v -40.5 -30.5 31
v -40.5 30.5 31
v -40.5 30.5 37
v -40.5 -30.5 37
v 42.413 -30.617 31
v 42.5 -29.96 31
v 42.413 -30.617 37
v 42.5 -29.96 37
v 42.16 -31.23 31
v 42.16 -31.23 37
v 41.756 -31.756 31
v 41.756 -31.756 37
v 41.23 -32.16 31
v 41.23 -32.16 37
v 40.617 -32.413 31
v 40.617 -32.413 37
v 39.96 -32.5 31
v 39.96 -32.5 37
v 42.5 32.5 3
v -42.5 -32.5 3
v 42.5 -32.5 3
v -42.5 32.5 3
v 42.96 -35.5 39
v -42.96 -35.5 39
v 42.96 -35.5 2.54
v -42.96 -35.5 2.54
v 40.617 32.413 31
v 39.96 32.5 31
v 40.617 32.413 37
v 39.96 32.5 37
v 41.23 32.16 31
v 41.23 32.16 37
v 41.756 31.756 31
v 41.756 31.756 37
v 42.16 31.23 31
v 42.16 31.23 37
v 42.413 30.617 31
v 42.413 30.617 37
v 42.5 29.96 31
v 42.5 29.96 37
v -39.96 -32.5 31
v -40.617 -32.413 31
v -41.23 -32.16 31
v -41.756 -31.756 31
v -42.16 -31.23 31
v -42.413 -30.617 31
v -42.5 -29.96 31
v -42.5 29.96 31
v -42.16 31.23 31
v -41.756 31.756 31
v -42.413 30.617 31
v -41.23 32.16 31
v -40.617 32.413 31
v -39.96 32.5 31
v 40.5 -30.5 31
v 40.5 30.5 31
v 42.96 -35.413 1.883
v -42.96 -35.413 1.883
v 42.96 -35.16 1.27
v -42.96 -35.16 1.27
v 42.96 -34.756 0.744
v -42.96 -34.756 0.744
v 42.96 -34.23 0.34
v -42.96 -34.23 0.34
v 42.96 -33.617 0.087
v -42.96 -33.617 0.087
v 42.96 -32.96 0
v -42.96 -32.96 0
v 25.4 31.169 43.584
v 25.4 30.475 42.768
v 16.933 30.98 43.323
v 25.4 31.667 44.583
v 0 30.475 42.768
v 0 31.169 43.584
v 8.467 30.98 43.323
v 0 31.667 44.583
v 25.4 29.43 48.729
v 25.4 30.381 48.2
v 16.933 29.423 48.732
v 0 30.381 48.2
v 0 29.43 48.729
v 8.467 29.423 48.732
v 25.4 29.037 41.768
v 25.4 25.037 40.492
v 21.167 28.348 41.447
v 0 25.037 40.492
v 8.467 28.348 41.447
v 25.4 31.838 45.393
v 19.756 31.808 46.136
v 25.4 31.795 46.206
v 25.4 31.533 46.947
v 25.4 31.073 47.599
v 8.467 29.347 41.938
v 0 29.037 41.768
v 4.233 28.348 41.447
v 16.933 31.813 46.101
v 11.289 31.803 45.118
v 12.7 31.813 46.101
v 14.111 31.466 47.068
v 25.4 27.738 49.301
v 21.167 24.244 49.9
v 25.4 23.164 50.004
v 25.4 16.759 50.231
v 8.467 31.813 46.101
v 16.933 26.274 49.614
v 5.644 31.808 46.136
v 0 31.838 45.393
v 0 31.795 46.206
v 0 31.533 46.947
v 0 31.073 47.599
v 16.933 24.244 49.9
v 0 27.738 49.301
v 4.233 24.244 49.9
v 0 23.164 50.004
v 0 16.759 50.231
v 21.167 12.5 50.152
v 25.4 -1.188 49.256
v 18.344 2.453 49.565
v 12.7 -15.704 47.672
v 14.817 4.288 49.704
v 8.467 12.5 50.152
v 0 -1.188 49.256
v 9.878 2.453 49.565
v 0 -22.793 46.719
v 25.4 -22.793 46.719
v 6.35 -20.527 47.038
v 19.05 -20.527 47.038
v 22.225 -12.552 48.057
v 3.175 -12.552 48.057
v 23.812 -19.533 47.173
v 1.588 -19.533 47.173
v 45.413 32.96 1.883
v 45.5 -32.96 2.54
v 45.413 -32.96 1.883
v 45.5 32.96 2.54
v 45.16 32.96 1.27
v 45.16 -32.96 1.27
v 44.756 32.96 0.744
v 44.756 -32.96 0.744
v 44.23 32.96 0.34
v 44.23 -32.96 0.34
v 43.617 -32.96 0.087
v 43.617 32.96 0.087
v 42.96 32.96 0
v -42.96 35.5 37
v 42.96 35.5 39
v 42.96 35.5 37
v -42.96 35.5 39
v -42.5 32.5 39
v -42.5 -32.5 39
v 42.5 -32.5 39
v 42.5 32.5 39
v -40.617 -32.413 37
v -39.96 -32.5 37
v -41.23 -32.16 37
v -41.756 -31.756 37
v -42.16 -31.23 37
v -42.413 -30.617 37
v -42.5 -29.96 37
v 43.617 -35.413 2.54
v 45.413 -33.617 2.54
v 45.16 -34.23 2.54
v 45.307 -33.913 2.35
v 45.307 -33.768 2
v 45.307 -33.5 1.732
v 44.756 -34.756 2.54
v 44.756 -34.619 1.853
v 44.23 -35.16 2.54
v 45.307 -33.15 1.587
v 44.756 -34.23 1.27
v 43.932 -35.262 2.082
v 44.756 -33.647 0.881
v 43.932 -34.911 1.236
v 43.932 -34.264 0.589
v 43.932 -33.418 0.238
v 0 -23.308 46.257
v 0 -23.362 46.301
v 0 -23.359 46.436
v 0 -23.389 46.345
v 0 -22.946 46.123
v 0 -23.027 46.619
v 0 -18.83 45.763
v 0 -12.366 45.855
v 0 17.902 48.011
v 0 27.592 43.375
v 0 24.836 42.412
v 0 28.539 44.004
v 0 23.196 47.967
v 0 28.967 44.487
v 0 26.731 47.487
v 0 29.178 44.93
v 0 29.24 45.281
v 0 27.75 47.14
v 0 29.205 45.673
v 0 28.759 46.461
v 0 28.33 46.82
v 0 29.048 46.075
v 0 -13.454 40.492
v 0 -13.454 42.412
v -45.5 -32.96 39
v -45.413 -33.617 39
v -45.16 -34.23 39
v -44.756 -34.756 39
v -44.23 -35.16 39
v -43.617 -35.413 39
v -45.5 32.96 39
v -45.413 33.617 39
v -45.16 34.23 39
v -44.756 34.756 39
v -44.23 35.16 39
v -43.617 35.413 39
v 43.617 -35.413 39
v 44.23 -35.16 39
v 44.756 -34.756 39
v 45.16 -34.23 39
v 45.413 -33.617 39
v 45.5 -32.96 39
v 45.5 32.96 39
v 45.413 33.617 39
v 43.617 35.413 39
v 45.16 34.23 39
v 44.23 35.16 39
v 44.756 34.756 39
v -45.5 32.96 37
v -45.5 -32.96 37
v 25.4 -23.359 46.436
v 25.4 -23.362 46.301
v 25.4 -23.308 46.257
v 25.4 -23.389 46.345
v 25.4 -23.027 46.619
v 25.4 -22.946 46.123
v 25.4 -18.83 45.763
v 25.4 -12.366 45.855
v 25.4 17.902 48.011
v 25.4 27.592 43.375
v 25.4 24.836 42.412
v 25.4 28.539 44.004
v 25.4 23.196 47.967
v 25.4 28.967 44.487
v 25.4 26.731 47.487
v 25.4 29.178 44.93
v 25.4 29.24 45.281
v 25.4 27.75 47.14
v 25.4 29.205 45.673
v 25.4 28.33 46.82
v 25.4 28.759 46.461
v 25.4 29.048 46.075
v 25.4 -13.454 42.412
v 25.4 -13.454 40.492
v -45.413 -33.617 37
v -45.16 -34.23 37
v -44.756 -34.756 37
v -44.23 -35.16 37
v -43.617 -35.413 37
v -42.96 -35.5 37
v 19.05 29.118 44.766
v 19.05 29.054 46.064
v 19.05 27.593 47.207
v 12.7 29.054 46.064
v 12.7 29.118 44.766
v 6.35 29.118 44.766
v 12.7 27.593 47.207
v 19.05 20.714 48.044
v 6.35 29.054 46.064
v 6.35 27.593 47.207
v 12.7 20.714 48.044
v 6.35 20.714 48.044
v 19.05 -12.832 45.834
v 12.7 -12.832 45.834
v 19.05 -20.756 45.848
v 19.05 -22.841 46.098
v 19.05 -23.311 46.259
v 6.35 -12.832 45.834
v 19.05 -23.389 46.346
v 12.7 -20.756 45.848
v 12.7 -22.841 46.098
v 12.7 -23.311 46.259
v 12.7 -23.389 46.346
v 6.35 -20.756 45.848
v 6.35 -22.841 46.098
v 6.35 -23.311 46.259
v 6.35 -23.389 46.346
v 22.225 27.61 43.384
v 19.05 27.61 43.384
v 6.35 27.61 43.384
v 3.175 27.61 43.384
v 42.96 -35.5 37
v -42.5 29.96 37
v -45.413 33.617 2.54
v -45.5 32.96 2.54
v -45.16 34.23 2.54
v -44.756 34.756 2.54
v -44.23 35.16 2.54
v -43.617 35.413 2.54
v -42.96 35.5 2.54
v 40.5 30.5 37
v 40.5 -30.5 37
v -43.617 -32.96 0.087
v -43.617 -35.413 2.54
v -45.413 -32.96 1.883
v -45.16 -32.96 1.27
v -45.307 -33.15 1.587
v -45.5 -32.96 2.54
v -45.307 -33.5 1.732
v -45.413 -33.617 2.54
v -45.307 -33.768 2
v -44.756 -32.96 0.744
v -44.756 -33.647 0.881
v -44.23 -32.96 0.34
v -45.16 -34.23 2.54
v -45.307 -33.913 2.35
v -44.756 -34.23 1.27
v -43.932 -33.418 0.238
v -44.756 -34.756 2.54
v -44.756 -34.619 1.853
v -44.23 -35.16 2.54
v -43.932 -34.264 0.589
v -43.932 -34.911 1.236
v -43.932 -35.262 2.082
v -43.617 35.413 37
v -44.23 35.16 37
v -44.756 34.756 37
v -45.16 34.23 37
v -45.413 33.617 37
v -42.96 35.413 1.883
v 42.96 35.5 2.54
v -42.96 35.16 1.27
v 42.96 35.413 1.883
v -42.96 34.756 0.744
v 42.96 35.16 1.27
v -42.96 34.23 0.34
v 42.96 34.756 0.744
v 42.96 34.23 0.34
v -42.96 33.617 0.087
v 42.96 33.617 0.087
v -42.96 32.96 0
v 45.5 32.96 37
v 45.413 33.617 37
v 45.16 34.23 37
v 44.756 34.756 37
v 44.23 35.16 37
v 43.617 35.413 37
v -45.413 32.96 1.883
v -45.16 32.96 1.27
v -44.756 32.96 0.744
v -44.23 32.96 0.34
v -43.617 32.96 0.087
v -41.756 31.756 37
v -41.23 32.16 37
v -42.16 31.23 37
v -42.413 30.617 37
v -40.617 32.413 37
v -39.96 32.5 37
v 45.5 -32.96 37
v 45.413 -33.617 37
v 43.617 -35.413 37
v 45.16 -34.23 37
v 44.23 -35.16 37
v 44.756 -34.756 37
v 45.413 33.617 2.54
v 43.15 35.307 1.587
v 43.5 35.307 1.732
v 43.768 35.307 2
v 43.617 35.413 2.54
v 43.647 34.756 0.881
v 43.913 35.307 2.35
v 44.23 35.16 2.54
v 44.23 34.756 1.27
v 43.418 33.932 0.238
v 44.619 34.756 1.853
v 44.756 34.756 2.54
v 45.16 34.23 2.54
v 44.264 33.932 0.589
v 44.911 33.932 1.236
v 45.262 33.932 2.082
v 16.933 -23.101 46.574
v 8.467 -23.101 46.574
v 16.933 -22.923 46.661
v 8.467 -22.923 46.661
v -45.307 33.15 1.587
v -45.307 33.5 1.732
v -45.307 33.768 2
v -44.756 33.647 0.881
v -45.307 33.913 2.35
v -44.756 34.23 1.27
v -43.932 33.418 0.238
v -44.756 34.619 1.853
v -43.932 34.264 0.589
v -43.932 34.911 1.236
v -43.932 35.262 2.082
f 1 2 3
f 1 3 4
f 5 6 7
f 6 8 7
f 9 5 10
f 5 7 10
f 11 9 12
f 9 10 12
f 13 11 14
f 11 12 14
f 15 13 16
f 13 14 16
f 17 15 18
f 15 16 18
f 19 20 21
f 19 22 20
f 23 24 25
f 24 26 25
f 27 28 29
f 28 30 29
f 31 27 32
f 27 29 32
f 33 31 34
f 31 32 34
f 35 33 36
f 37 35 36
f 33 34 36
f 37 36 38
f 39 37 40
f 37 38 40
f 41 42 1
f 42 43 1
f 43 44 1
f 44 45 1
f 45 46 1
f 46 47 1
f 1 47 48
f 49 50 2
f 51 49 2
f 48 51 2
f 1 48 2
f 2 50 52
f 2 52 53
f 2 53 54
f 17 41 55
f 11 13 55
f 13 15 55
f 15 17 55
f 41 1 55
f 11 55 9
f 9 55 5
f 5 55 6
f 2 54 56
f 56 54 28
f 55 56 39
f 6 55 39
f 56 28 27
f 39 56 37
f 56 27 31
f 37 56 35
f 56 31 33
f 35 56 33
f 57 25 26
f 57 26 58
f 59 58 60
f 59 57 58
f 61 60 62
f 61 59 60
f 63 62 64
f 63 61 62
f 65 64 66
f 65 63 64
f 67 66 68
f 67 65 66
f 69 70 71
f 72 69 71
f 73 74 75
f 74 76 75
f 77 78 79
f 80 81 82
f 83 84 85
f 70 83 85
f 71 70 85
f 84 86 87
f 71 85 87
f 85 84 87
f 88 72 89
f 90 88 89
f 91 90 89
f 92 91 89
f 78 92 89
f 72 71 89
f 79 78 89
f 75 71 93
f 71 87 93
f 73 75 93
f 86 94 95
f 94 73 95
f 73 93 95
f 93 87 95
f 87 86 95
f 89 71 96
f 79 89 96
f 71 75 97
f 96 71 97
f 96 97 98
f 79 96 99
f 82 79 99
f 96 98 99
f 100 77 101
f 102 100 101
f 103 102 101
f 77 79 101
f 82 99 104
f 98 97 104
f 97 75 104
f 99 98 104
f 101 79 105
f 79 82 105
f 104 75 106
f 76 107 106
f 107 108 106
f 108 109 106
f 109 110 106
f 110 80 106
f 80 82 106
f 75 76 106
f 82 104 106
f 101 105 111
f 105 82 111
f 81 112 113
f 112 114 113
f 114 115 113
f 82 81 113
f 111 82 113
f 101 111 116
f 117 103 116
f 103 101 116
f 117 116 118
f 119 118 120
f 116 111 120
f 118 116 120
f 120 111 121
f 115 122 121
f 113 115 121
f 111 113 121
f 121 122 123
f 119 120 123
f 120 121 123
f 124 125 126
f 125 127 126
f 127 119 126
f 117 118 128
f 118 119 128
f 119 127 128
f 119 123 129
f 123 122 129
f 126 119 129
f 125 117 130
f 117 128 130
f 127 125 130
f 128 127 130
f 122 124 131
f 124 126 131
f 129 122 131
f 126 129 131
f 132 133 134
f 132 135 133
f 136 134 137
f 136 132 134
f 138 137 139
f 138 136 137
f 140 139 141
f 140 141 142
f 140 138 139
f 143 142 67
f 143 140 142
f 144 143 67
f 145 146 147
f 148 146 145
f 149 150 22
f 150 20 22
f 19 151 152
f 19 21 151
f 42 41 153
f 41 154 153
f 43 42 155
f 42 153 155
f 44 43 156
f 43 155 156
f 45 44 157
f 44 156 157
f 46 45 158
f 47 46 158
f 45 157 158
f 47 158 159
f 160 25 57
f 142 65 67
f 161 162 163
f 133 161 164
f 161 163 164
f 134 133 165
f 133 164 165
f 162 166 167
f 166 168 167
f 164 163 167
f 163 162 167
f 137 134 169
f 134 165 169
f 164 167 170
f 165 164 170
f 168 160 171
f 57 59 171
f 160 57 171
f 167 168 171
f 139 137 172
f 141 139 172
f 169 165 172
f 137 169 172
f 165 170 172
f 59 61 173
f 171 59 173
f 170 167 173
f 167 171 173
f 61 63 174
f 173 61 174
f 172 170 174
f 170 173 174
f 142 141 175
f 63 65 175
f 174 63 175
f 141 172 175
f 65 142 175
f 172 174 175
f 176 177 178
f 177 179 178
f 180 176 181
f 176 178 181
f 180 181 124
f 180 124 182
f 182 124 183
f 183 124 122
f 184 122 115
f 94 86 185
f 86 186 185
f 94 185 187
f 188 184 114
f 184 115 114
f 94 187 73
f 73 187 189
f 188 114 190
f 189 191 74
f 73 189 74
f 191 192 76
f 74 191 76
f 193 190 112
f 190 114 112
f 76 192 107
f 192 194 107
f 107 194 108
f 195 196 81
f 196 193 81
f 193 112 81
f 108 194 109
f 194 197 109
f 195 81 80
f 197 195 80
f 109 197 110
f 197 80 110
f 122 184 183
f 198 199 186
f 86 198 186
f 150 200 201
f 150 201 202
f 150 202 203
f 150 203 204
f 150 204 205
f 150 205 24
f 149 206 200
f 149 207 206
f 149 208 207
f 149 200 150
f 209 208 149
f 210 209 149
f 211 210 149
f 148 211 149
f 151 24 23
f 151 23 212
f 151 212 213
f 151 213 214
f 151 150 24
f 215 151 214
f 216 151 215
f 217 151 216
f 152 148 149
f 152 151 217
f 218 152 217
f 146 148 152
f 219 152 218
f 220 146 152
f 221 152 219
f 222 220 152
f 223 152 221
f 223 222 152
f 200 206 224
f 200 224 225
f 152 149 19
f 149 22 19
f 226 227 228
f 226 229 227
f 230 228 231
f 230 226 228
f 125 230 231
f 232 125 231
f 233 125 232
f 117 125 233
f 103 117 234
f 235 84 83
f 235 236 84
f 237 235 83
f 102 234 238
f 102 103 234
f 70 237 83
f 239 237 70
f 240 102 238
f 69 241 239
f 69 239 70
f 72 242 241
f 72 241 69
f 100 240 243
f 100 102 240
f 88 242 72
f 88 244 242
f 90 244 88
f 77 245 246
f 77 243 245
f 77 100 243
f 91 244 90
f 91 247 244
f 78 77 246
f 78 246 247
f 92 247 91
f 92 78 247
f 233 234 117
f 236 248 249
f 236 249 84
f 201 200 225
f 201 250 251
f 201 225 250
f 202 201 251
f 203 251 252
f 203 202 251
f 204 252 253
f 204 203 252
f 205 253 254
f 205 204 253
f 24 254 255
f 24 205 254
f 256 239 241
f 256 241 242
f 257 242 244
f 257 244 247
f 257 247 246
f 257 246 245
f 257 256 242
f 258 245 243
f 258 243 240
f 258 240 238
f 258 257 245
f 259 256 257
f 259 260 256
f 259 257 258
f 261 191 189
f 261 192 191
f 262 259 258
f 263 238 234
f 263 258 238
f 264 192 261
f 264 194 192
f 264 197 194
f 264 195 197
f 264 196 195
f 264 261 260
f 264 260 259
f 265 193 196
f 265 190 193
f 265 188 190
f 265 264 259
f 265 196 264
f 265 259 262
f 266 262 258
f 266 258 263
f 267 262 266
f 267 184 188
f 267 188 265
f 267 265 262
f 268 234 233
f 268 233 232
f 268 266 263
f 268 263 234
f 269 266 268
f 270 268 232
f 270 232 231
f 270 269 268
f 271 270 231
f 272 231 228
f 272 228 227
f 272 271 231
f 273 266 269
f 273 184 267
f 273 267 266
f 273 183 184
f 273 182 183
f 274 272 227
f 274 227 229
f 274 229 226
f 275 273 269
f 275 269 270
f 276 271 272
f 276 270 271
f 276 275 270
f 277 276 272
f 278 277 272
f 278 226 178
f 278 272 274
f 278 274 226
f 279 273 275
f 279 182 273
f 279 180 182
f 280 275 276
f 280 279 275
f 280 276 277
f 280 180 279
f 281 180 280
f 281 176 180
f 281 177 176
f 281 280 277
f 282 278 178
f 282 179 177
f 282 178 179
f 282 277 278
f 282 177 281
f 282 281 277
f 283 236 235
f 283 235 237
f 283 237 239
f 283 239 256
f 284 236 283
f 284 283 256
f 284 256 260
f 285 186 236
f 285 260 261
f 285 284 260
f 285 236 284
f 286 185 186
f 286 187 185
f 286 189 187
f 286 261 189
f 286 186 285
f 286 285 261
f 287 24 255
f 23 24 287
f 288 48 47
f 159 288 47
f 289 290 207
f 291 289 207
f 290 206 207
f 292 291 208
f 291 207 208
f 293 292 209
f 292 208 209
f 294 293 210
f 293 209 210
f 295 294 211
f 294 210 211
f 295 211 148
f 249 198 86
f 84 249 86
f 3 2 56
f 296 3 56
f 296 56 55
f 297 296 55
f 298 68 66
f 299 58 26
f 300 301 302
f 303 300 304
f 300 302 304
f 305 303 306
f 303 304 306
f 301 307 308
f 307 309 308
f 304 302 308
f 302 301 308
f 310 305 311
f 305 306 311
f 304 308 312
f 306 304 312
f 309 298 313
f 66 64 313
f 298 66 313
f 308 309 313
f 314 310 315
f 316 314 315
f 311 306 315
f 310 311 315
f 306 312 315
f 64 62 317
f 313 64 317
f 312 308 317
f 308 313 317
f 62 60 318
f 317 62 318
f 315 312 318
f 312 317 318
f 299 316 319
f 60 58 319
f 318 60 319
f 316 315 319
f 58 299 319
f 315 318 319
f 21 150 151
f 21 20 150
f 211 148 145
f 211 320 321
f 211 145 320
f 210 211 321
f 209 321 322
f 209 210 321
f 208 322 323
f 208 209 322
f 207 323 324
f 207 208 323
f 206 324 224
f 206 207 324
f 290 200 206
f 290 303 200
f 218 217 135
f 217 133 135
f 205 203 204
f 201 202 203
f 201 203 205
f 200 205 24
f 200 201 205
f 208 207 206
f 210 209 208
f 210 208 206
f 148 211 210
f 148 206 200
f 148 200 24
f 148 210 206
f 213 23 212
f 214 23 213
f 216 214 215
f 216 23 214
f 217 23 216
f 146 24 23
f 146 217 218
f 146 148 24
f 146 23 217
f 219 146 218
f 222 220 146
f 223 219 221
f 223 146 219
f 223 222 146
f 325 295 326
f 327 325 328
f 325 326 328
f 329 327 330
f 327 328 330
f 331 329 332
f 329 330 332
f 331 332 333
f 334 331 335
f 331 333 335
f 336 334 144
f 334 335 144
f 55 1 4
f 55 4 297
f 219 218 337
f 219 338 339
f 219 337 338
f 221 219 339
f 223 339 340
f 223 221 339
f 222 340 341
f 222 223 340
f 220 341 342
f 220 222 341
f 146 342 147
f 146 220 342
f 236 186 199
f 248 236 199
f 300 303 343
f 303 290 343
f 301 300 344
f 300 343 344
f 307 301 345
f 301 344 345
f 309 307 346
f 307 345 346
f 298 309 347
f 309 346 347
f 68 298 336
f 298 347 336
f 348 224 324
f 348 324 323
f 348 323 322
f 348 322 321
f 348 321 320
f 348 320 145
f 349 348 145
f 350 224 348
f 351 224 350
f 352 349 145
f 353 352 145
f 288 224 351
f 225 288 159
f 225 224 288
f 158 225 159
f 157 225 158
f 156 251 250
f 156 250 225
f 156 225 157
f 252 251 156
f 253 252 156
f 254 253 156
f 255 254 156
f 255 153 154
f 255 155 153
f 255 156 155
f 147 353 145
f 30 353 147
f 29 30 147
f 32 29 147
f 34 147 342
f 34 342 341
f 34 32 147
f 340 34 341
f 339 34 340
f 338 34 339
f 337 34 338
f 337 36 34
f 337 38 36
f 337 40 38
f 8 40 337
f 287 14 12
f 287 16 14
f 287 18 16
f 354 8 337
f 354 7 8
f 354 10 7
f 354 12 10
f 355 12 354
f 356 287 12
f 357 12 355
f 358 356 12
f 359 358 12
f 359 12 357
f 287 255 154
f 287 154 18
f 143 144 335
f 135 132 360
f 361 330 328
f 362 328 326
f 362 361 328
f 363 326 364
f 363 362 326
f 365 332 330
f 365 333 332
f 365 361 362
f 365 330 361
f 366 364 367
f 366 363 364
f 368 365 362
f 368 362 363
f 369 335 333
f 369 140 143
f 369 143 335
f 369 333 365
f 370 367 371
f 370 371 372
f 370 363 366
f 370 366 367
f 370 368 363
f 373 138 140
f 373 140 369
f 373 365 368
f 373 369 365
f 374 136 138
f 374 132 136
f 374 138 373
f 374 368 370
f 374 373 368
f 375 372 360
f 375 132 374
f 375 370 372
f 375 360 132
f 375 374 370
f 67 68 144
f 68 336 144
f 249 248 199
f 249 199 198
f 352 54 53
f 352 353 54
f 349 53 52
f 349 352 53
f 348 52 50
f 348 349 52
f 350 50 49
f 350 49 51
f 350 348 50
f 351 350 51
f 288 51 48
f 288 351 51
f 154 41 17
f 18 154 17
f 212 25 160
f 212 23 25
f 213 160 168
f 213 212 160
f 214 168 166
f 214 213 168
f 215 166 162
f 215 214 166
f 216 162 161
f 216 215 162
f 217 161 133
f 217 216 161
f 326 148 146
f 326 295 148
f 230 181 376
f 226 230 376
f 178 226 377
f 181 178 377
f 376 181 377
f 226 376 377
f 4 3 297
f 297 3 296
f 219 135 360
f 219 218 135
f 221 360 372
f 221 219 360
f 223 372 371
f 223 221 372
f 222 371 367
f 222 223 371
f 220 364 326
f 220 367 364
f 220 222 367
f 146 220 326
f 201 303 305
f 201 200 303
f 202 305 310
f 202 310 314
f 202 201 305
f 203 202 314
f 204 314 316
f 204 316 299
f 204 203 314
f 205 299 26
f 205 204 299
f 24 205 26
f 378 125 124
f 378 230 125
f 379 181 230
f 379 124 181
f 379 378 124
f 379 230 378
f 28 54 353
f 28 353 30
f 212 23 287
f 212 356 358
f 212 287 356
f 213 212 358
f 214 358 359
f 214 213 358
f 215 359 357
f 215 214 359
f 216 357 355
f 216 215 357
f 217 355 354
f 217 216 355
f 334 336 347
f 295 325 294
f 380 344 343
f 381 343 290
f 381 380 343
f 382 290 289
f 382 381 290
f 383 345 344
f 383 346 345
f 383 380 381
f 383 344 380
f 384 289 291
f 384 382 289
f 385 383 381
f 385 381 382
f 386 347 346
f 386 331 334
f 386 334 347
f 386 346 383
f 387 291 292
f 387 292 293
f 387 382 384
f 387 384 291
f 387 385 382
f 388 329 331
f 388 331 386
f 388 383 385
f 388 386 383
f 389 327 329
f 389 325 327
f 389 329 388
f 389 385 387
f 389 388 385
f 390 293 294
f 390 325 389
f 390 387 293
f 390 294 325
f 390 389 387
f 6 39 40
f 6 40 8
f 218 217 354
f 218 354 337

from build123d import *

# Parameters (mm, degrees)
F0_W      = 91
F0_H      = 71
F1_DEPTH  = 39
F2_R      = 2.54
F3_T      = -3
F5_DEPTH  = 8
F6_W      = 85
F6_H      = 65
F7_DEPTH  = 6
F8_T      = -2
F9_R      = 2.54
F11_DEPTH = 25.4


with BuildPart() as f1:
    # F0 (on Top) → F1 (new body)
    with BuildSketch(Plane.XY):
        Rectangle(F0_W, F0_H)
    extrude(amount=F1_DEPTH)

    # F2
    f2_edges = [f1.edges().sort_by_distance(p)[0] for p in [
        (0, -35.5, 0),
        (45.5, -35.5, 19.5),
        (45.5, 0, 0),
        (0, 35.5, 0),
        (45.5, 35.5, 19.5),
        (-45.5, 0, 0),
        (-45.5, 35.5, 19.5),
        (-45.5, -35.5, 19.5),
    ]]
    fillet(f2_edges, radius=F2_R)

    # F3
    f3_openings = [f1.faces().sort_by_distance(p)[0] for p in [
        (0, 0, 39),
    ]]
    offset(amount=F3_T, openings=f3_openings)


with BuildPart() as f5:
    # F4 (on face) → F5 (new body)
    with BuildSketch(Plane.XY.offset(39)):
        with BuildLine():
            Line((42.96, 35.5), (-42.96, 35.5))
            ThreePointArc((-42.96, 35.5), (-44.7560512242, 34.7560512242), (-45.5, 32.96))
            Line((-45.5, 32.96), (-45.5, -32.96))
            ThreePointArc((-45.5, -32.96), (-44.7560512242, -34.7560512242), (-42.96, -35.5))
            Line((-42.96, -35.5), (42.96, -35.5))
            ThreePointArc((42.96, -35.5), (44.7560512242, -34.7560512242), (45.5, -32.96))
            Line((45.5, -32.96), (45.5, 32.96))
            ThreePointArc((45.5, 32.96), (44.7560512242, 34.7560512242), (42.96, 35.5))
        make_face()
    extrude(amount=-F5_DEPTH)

    # F6 (on face) → F7 (cut)
    with BuildSketch(Plane(origin=(0, 0, 31), x_dir=(1, 0, 0), z_dir=(0, 0, -1))):
        with BuildLine():
            ThreePointArc((-45.5, -32.96), (-44.7560512242, -34.7560512242), (-42.96, -35.5))
            Line((-42.96, -35.5), (42.96, -35.5))
            ThreePointArc((42.96, -35.5), (44.7560512242, -34.7560512242), (45.5, -32.96))
            Line((45.5, -32.96), (45.5, 32.96))
            ThreePointArc((45.5, 32.96), (44.7560512242, 34.7560512242), (42.96, 35.5))
            Line((42.96, 35.5), (-42.96, 35.5))
            ThreePointArc((-42.96, 35.5), (-44.7560512242, 34.7560512242), (-45.5, 32.96))
            Line((-45.5, 32.96), (-45.5, -32.96))
        make_face()
        Rectangle(F6_W, F6_H, mode=Mode.SUBTRACT)
    extrude(amount=-F7_DEPTH, mode=Mode.SUBTRACT)

    # F8
    f8_openings = [f5.faces().sort_by_distance(p)[0] for p in [
        (0, 0, 31),
    ]]
    offset(amount=F8_T, openings=f8_openings, kind=Kind.INTERSECTION)

    # F9
    f9_edges = [f5.edges().sort_by_distance(p)[0] for p in [
        (-42.5, 32.5, 34),
        (-42.5, -32.5, 34),
        (42.5, -32.5, 34),
        (42.5, 32.5, 34),
    ]]
    fillet(f9_edges, radius=F9_R)


with BuildPart() as f11:
    # F10 (on Right) → F11 (new body)
    with BuildSketch(Plane.YZ):
        with BuildLine():
            Line((-13.4536381811, 42.4117706716), (-13.4536381811, 40.4924117029))
            Line((-13.4536381811, 40.4924117029), (25.0369273126, 40.4924117029))
            add(Edge.make_bspline(
                [(25.0369273126, 40.4924117029), (27.2628915883, 40.9646055378), (31.8773388123, 42.2316396654), (33.4123125919, 54.8590983413), (-20.6696610192, 47.0263792907), (-22.7932613343, 46.7188172042)],
                knots=[0, 0, 0, 0, 0.1979306392, 0.3809684392, 0.9386301929, 0.9386301929, 0.9386301929, 0.9386301929], degree=3))
            add(Edge.make_bspline(
                [(-23.0265979574, 46.6185346514), (-22.9164563186, 46.664106875), (-22.8177945923, 46.700491997), (-22.7932613343, 46.7188172042)],
                knots=[0.9743274998, 0.9743274998, 0.9743274998, 0.9743274998, 1, 1, 1, 1], degree=3))
            add(Edge.make_bspline(
                [(-23.0265979574, 46.6185346514), (-23.0862022713, 46.5802474202), (-23.1847080136, 46.5230996611), (-23.3592987061, 46.4358069003)],
                knots=[0.9810708663, 0.9810708663, 0.9810708663, 0.9810708663, 1, 1, 1, 1], degree=3))
            add(Edge.make_bspline(
                [(24.8361602426, 42.4117706716), (26.9824378192, 42.9357513785), (29.9467392966, 44.2799584418), (27.7321976863, 50.3527392042), (-10.9477218777, 44.7803133285), (-23.8172236886, 45.9502209177), (-23.3592987061, 46.4358069003)],
                knots=[0, 0, 0, 0, 0.1544793422, 0.2730371495, 0.7174796363, 0.9444073013, 0.9444073013, 0.9444073013, 0.9444073013], degree=3))
            Line((24.8361602426, 42.4117706716), (-13.4536381811, 42.4117706716))
        make_face()
    extrude(amount=F11_DEPTH)


solid = Compound([f1.part, f5.part, f11.part])
